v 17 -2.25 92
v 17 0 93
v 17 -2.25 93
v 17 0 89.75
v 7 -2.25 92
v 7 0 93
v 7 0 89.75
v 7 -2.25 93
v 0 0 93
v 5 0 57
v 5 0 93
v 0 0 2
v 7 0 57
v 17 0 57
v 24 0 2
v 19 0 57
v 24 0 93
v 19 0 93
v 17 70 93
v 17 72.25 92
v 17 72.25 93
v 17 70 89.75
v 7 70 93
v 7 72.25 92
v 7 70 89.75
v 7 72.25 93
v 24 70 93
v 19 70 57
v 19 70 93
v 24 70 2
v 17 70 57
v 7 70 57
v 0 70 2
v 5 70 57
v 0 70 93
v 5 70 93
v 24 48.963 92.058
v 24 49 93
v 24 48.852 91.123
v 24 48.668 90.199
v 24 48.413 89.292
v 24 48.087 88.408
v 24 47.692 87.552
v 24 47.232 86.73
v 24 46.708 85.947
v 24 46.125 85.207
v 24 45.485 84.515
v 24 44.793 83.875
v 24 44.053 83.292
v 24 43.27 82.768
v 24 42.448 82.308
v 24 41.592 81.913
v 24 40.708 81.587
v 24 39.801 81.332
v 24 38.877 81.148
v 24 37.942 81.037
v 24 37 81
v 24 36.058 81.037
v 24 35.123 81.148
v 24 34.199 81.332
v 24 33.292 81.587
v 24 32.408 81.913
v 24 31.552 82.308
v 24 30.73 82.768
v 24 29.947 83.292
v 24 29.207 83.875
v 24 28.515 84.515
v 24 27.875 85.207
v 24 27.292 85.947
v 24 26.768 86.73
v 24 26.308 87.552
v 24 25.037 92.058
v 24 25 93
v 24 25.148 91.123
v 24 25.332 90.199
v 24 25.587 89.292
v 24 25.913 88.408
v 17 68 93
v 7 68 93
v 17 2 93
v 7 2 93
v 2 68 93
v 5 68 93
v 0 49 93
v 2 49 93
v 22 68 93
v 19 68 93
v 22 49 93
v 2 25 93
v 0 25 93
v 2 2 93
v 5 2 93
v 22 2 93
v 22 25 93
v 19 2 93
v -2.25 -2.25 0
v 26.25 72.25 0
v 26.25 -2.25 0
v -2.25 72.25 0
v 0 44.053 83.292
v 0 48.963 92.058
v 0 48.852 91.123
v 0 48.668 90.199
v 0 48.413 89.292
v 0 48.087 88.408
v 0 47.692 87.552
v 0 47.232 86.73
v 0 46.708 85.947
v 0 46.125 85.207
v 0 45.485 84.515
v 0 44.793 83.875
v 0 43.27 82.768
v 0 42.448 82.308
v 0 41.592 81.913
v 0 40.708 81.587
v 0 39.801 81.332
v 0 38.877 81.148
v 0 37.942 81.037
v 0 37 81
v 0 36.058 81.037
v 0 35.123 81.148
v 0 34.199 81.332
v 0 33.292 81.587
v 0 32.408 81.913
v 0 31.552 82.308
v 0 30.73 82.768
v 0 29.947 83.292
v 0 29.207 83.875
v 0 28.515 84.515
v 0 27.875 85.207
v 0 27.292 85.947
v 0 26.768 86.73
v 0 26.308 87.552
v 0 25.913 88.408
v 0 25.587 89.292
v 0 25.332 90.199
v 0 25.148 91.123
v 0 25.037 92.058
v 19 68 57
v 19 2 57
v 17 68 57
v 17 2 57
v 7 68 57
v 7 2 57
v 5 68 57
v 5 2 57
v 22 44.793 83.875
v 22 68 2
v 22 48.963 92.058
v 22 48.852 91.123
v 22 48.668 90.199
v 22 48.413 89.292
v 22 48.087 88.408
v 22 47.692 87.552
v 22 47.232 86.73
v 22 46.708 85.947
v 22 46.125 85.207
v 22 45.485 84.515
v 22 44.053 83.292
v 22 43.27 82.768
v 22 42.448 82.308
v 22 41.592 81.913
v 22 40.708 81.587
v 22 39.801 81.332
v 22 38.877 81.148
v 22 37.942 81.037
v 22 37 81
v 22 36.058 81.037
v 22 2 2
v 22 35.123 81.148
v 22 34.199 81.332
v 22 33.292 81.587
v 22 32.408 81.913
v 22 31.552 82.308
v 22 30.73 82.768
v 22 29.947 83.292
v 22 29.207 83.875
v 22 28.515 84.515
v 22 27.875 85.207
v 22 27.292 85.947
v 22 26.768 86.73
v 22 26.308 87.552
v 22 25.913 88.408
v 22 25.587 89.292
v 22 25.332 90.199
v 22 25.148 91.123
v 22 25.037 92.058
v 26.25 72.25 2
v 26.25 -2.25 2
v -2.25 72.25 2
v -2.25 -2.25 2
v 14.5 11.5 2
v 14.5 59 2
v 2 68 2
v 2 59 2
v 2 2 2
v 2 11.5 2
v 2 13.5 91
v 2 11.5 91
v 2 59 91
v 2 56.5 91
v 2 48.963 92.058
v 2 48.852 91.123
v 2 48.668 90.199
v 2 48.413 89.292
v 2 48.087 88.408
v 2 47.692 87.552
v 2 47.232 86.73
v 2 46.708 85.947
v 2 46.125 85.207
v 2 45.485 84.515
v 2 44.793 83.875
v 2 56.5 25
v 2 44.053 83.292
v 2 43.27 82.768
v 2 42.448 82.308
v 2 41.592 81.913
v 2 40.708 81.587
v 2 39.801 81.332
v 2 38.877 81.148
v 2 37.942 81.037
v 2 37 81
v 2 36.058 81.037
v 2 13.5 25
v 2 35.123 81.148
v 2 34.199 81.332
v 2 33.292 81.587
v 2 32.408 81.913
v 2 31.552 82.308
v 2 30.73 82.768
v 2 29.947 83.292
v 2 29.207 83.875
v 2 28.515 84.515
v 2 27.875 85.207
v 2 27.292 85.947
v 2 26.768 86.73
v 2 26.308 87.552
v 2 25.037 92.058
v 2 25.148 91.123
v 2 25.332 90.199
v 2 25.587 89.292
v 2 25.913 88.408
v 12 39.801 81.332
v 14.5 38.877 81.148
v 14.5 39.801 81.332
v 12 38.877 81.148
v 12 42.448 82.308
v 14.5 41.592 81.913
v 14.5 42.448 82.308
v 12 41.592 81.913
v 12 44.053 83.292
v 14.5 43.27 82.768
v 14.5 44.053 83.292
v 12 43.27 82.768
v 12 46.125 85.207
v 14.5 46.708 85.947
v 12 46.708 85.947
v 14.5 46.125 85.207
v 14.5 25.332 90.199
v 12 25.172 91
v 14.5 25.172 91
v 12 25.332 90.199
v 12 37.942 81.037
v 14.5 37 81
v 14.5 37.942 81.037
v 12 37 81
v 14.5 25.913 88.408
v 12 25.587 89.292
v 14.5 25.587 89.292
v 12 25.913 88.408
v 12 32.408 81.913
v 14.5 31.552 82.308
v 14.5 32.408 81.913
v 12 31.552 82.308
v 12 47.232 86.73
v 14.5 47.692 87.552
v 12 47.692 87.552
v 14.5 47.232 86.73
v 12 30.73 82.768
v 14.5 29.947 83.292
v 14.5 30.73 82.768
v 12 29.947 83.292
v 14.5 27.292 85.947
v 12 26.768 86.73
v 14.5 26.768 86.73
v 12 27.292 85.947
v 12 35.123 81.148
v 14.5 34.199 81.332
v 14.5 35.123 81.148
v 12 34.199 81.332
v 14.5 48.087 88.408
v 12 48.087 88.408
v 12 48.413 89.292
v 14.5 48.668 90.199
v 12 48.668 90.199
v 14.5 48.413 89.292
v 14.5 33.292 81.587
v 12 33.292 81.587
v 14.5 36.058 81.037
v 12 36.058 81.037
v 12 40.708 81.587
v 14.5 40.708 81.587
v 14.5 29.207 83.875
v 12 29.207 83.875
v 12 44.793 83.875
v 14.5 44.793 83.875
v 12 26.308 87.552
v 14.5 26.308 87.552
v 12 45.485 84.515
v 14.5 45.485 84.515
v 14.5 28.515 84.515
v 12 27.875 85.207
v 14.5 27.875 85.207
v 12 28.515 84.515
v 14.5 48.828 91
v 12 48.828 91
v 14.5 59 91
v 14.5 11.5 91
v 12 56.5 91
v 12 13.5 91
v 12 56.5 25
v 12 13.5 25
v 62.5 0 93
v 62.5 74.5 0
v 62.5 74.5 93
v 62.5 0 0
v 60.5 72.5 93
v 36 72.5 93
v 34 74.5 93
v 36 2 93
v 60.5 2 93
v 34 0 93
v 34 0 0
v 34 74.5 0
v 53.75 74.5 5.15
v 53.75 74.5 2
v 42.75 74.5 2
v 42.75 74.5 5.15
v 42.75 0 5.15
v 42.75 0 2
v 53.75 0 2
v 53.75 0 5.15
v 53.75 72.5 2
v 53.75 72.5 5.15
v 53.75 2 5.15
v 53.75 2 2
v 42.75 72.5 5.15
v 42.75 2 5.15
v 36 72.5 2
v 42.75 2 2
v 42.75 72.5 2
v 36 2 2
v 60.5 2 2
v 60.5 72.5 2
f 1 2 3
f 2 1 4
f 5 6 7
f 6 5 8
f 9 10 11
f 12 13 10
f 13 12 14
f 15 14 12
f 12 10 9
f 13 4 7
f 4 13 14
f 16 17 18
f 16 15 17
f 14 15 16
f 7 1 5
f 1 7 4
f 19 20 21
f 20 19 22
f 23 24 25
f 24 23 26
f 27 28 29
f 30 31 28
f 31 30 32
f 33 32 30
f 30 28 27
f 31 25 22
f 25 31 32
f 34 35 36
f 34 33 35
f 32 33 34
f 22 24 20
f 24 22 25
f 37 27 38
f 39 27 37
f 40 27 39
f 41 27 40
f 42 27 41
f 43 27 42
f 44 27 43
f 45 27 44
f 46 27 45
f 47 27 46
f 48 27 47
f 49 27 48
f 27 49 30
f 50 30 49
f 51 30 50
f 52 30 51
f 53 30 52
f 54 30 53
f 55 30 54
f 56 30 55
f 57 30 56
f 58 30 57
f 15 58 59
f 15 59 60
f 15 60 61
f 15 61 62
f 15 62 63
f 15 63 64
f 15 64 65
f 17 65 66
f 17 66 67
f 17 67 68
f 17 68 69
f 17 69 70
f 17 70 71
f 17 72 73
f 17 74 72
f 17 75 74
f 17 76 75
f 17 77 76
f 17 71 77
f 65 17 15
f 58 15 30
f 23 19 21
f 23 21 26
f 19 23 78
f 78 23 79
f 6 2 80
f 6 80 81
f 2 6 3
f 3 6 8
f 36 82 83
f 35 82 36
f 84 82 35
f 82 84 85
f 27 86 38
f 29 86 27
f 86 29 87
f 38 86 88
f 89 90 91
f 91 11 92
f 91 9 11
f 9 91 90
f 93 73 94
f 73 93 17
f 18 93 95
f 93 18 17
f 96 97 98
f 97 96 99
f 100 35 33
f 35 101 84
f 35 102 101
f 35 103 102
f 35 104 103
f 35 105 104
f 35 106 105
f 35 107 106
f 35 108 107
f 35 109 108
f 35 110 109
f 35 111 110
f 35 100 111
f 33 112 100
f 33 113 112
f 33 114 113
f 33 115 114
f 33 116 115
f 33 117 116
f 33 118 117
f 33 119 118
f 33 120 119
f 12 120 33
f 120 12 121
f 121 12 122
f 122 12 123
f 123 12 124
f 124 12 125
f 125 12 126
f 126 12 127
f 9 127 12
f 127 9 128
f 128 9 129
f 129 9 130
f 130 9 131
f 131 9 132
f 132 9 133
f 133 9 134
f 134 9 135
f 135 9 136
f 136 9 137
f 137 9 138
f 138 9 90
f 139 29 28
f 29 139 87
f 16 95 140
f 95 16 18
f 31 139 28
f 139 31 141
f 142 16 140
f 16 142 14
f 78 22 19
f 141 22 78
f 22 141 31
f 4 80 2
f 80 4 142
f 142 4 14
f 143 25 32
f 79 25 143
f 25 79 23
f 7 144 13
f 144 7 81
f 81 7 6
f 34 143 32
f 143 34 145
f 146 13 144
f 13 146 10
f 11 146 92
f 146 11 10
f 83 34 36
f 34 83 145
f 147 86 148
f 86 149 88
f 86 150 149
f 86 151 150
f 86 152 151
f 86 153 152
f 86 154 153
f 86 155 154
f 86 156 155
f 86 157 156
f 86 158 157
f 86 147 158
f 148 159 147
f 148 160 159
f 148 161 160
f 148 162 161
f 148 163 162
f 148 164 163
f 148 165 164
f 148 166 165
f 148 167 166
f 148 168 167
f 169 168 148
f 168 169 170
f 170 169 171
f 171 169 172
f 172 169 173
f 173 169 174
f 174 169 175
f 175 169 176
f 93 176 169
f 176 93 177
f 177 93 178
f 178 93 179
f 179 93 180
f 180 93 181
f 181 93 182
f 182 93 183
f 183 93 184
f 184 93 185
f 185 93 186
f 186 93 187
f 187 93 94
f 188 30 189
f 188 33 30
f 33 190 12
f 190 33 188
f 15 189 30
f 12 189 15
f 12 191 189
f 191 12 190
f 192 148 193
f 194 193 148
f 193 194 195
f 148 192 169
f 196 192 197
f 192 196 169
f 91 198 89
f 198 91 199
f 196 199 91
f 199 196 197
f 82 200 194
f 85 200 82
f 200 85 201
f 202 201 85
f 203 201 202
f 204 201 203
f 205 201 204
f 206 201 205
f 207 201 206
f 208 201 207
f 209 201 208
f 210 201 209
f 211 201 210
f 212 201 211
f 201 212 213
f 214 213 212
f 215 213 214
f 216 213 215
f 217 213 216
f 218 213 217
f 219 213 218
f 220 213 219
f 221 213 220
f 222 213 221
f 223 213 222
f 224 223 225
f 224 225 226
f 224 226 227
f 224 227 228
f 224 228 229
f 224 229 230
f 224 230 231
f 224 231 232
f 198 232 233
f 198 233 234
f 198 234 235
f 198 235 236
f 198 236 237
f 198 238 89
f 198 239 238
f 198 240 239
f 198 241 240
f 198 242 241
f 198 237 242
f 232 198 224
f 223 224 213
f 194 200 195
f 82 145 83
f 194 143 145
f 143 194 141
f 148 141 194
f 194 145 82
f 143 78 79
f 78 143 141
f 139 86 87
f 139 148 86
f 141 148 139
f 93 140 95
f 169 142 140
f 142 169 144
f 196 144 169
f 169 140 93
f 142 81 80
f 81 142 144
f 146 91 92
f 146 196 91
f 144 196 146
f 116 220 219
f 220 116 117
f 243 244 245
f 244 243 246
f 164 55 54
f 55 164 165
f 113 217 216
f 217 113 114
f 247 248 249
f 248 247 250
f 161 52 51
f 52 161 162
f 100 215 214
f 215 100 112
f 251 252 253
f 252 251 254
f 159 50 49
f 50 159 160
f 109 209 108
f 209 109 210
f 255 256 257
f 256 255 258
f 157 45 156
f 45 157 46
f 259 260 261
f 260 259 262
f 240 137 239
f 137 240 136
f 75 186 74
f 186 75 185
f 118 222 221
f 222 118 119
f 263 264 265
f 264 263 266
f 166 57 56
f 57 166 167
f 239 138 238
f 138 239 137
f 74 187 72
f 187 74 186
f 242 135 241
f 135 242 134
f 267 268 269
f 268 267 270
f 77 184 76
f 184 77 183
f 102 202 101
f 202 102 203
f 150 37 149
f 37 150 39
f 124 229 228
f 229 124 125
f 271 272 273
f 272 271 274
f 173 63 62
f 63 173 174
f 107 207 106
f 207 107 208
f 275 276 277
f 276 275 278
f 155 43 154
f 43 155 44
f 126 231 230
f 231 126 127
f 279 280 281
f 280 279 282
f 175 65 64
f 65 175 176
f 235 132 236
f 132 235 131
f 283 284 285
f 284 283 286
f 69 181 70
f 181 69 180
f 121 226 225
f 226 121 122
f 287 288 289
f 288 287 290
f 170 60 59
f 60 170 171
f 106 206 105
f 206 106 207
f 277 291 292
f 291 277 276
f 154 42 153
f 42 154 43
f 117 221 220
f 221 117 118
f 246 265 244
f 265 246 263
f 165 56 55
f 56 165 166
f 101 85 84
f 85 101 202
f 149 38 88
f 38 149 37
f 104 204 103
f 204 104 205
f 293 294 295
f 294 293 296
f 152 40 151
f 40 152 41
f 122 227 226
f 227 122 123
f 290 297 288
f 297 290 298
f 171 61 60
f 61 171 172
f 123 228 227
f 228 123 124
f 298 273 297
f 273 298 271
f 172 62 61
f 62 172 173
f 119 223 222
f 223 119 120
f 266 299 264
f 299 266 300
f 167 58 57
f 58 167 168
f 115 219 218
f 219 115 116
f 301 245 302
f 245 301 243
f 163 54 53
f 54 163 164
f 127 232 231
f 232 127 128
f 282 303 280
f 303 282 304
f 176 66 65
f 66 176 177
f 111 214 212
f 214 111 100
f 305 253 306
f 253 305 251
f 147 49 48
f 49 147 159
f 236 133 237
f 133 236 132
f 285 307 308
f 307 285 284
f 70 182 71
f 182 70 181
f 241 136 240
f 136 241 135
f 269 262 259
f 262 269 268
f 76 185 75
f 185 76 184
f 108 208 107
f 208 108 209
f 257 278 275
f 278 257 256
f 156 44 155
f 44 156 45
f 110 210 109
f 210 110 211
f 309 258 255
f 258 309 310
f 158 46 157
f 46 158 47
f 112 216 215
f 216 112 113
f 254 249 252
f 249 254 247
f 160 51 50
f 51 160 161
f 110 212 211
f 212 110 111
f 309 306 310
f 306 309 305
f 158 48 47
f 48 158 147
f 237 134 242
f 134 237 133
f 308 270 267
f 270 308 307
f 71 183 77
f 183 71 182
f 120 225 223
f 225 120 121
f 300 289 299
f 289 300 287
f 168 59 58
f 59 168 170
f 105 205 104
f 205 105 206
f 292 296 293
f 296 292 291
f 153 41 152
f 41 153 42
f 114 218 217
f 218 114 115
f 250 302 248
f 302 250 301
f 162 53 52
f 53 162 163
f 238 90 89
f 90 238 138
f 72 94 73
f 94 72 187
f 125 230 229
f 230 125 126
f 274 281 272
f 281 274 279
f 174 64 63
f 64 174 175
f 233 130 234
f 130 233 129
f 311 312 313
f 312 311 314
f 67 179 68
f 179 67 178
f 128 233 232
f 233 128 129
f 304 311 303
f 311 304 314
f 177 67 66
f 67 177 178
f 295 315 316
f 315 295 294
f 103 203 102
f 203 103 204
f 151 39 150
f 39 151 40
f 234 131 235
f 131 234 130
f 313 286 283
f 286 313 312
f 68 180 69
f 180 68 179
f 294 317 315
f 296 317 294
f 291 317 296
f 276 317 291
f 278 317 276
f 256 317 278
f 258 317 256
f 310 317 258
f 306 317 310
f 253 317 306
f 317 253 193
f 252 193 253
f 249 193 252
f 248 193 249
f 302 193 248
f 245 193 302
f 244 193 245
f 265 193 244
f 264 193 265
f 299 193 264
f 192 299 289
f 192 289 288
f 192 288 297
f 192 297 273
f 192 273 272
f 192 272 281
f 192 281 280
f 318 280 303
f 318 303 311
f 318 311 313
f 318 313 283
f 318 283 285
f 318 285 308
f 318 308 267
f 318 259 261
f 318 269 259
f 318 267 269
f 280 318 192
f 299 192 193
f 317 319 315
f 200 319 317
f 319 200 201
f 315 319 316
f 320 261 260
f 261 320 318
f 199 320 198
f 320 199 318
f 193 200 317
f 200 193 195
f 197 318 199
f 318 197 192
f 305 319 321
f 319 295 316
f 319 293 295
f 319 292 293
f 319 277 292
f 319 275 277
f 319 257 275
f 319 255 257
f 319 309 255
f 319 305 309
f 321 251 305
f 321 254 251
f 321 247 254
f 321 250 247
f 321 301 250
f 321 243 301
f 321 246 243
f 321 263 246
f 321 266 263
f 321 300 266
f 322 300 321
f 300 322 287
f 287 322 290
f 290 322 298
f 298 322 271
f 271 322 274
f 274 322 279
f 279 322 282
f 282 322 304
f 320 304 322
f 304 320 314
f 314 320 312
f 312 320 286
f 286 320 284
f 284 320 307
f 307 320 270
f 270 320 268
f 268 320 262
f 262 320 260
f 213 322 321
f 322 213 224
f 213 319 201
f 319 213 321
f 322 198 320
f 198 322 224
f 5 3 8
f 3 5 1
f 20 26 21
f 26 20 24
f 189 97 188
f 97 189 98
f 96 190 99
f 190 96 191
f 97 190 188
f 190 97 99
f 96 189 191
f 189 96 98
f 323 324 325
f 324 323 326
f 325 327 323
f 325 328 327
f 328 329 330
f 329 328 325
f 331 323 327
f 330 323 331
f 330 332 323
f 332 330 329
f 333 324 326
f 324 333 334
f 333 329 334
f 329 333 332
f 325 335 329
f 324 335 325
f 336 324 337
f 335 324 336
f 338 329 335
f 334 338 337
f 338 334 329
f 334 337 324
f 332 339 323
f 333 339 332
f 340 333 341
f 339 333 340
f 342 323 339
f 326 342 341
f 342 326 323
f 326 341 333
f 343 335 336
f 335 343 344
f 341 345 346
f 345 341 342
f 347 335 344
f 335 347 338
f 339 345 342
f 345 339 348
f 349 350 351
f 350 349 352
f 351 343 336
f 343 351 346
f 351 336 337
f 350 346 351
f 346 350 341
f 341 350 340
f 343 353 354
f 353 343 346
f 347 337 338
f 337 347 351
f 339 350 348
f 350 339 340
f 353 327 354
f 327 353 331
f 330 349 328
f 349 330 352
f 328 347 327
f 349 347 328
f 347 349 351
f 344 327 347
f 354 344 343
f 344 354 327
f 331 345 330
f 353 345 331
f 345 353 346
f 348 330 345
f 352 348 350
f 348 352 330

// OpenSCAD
/* customizable card box
 *
 * This work is derived from zxqueb (from Clevland, OH)'s:
 *   http://www.thingiverse.com/thing:92518
 *
 *   Parametric Card Box by zxqueb is licensed under the Creative
 *   Commons - Attribution license.
 *
 *   Downloaded on November 9, 2015.
 *
 * Changes:
 * - Reformatted and commented to be a little easier to read.
 * - Adjusted to be "tall" rather than "flat".
 * - ...
 *
 * Notes:
 * - Funny mix of all caps and other coding styles is my fault.
 * - 63.5 x 88 mm is standard FF sleeve
 * - 41 x 63 mm is small FF sleeve size
 */

CARD_SIZE_LONG_EDGE =20;
CARD_SIZE_SHORT_EDGE = 66;
CARD_STACK_HEIGHT = 91;
WALL_THICKNESS = 2;
TAB_THICKNESS = 10;
EXTRA_SPACE = .25;

smCardLongEdge  = 10;
smCardShortEdge = 43;
smCardHeight    = 66;
smCardBoost     = CARD_STACK_HEIGHT - smCardHeight - 2;


CARD_LONG_EDGE = CARD_SIZE_LONG_EDGE + (WALL_THICKNESS*2);
CARD_SHORT_EDGE = CARD_SIZE_SHORT_EDGE + (WALL_THICKNESS*2);
ALL_EXTRA_SPACE = (EXTRA_SPACE *2);

LID_OUTSIDE_LONG_THICKNESS = CARD_LONG_EDGE + (WALL_THICKNESS*2);
LID_OUTSIDE_SHORT_THICKNESS = CARD_SHORT_EDGE + (WALL_THICKNESS*2);

SPACE_BETWEEN_BOTTOM_AND_LID = LID_OUTSIDE_LONG_THICKNESS + (WALL_THICKNESS*2)+ 2;

HEIGHT = CARD_STACK_HEIGHT + WALL_THICKNESS;

boxBottom();
boxTop();

/* boxBottom() -- this part has the tabs that bend
 */
module boxBottom() {
//*Start wedge 1
translate ([((CARD_LONG_EDGE/2) -(TAB_THICKNESS/2)),
            -WALL_THICKNESS-EXTRA_SPACE,
            HEIGHT-WALL_THICKNESS-1-EXTRA_SPACE]) 
   difference (){
      cube ([TAB_THICKNESS,
             WALL_THICKNESS+EXTRA_SPACE,
             WALL_THICKNESS+EXTRA_SPACE]);

      translate ([0, WALL_THICKNESS+(EXTRA_SPACE),0]) rotate ([135,0,0])  
      cube ([(TAB_THICKNESS+3),
             sqrt(((WALL_THICKNESS+EXTRA_SPACE)*(WALL_THICKNESS+EXTRA_SPACE))+((WALL_THICKNESS+EXTRA_SPACE)*(WALL_THICKNESS+EXTRA_SPACE))),
             sqrt(((WALL_THICKNESS+EXTRA_SPACE)*(WALL_THICKNESS+EXTRA_SPACE))+((WALL_THICKNESS+EXTRA_SPACE)*(WALL_THICKNESS+EXTRA_SPACE)))]);

   }

//*Start wedge 2
translate ([((CARD_LONG_EDGE/2) - (TAB_THICKNESS/2)),
            CARD_SHORT_EDGE,
            HEIGHT-WALL_THICKNESS-1-EXTRA_SPACE])
   difference () {
      cube ([TAB_THICKNESS,
             WALL_THICKNESS+EXTRA_SPACE,
             WALL_THICKNESS+EXTRA_SPACE]);

      translate ([0 ,0 ,0]) rotate ([-45,0,0])
      cube ([(TAB_THICKNESS+3),
             sqrt(((WALL_THICKNESS+EXTRA_SPACE)*(WALL_THICKNESS+EXTRA_SPACE))+((WALL_THICKNESS+EXTRA_SPACE)*(WALL_THICKNESS+EXTRA_SPACE))),
             sqrt(((WALL_THICKNESS+EXTRA_SPACE)*(WALL_THICKNESS+EXTRA_SPACE))+((WALL_THICKNESS+EXTRA_SPACE)*(WALL_THICKNESS+EXTRA_SPACE)))]);
   }


/* tab */
translate ([((CARD_LONG_EDGE/2) -(TAB_THICKNESS/2)),
            -WALL_THICKNESS-EXTRA_SPACE,
            HEIGHT-1])
   cube ([TAB_THICKNESS, WALL_THICKNESS+EXTRA_SPACE, 1]); 

/* tab */
translate ([((CARD_LONG_EDGE/2) -(TAB_THICKNESS/2)),
            CARD_SHORT_EDGE,HEIGHT-1])
   cube ([TAB_THICKNESS, WALL_THICKNESS+EXTRA_SPACE, 1]);

/* bottom plate */
translate ([-WALL_THICKNESS-EXTRA_SPACE, -WALL_THICKNESS-EXTRA_SPACE, 0 ])
   cube ([CARD_LONG_EDGE + (WALL_THICKNESS*2)+ALL_EXTRA_SPACE,
          CARD_SHORT_EDGE + (WALL_THICKNESS*2)+ALL_EXTRA_SPACE,
          WALL_THICKNESS]);

difference() {
   /* main body */
   cube ([CARD_LONG_EDGE,CARD_SHORT_EDGE,HEIGHT]);

   /* first tab cutout */      
   translate([((CARD_LONG_EDGE / 2) + (TAB_THICKNESS/2)),
                   -.5,
                   0.6*(HEIGHT+ WALL_THICKNESS)])
           cube ([2, CARD_SHORT_EDGE + 2, HEIGHT]);

   /* second tab cutout */
   translate([((CARD_LONG_EDGE / 2) - ((TAB_THICKNESS/2)+2)),
              -.5,
              0.6*(HEIGHT+ WALL_THICKNESS)])
      cube ([2, CARD_SHORT_EDGE + 2, HEIGHT ]);

   /* diff out the interior */
   translate([WALL_THICKNESS,
              WALL_THICKNESS,
              WALL_THICKNESS])
      cube ([CARD_LONG_EDGE - (WALL_THICKNESS*2),
             CARD_SHORT_EDGE - (WALL_THICKNESS*2),
             HEIGHT]);

   /* diff out spot to grab cards */
   translate([-0.4, WALL_THICKNESS + CARD_SHORT_EDGE/2, HEIGHT])
      rotate([0,90,0])
         cylinder(r=12,
                  h=CARD_LONG_EDGE+2*WALL_THICKNESS+ALL_EXTRA_SPACE + 0.1,
                  $fn=80);
}
      /* small card region */
      difference() {
         translate([WALL_THICKNESS - 0.1,
                 (CARD_SHORT_EDGE - (smCardShortEdge + 2*WALL_THICKNESS))/2,
                 WALL_THICKNESS])
            cube([smCardLongEdge+WALL_THICKNESS+ALL_EXTRA_SPACE + 0.1,
                  smCardShortEdge+2*WALL_THICKNESS+ALL_EXTRA_SPACE,
                  smCardHeight + smCardBoost]);

         translate([WALL_THICKNESS,
                 (CARD_SHORT_EDGE - (smCardShortEdge + 2*WALL_THICKNESS))/2 + WALL_THICKNESS,
                 WALL_THICKNESS+smCardBoost])
            cube([smCardLongEdge,
                  smCardShortEdge,
                  smCardHeight+0.1]);

   /* diff out spot to grab cards */
   translate([-0.4, WALL_THICKNESS + CARD_SHORT_EDGE/2, HEIGHT])
      rotate([0,90,0])
         cylinder(r=12,
                  h=CARD_LONG_EDGE+2*WALL_THICKNESS+ALL_EXTRA_SPACE + 0.1,
                  $fn=80);
      }
}


/* boxTop() -- this part has the slots for the little tabs only.
 */
module boxTop() {
   translate ([SPACE_BETWEEN_BOTTOM_AND_LID, 0, 0]) {
      difference() {
         cube ([LID_OUTSIDE_LONG_THICKNESS+ALL_EXTRA_SPACE,
                LID_OUTSIDE_SHORT_THICKNESS+ALL_EXTRA_SPACE,
                HEIGHT]);

         translate([((LID_OUTSIDE_LONG_THICKNESS+ALL_EXTRA_SPACE) / 2)-((TAB_THICKNESS+1)/2),
                    -.5,
                    WALL_THICKNESS]) 
            cube ([(TAB_THICKNESS+1),
                   LID_OUTSIDE_SHORT_THICKNESS + 2,
                   WALL_THICKNESS+1.15 ]); 	//*Tab Hole

         translate([WALL_THICKNESS,
                    WALL_THICKNESS,
                    WALL_THICKNESS]) 
            cube ([LID_OUTSIDE_LONG_THICKNESS - (WALL_THICKNESS*2)+ALL_EXTRA_SPACE,
                   LID_OUTSIDE_SHORT_THICKNESS - (WALL_THICKNESS*2)+ALL_EXTRA_SPACE,
                   HEIGHT]);		//*Hole
      }
   }
}
